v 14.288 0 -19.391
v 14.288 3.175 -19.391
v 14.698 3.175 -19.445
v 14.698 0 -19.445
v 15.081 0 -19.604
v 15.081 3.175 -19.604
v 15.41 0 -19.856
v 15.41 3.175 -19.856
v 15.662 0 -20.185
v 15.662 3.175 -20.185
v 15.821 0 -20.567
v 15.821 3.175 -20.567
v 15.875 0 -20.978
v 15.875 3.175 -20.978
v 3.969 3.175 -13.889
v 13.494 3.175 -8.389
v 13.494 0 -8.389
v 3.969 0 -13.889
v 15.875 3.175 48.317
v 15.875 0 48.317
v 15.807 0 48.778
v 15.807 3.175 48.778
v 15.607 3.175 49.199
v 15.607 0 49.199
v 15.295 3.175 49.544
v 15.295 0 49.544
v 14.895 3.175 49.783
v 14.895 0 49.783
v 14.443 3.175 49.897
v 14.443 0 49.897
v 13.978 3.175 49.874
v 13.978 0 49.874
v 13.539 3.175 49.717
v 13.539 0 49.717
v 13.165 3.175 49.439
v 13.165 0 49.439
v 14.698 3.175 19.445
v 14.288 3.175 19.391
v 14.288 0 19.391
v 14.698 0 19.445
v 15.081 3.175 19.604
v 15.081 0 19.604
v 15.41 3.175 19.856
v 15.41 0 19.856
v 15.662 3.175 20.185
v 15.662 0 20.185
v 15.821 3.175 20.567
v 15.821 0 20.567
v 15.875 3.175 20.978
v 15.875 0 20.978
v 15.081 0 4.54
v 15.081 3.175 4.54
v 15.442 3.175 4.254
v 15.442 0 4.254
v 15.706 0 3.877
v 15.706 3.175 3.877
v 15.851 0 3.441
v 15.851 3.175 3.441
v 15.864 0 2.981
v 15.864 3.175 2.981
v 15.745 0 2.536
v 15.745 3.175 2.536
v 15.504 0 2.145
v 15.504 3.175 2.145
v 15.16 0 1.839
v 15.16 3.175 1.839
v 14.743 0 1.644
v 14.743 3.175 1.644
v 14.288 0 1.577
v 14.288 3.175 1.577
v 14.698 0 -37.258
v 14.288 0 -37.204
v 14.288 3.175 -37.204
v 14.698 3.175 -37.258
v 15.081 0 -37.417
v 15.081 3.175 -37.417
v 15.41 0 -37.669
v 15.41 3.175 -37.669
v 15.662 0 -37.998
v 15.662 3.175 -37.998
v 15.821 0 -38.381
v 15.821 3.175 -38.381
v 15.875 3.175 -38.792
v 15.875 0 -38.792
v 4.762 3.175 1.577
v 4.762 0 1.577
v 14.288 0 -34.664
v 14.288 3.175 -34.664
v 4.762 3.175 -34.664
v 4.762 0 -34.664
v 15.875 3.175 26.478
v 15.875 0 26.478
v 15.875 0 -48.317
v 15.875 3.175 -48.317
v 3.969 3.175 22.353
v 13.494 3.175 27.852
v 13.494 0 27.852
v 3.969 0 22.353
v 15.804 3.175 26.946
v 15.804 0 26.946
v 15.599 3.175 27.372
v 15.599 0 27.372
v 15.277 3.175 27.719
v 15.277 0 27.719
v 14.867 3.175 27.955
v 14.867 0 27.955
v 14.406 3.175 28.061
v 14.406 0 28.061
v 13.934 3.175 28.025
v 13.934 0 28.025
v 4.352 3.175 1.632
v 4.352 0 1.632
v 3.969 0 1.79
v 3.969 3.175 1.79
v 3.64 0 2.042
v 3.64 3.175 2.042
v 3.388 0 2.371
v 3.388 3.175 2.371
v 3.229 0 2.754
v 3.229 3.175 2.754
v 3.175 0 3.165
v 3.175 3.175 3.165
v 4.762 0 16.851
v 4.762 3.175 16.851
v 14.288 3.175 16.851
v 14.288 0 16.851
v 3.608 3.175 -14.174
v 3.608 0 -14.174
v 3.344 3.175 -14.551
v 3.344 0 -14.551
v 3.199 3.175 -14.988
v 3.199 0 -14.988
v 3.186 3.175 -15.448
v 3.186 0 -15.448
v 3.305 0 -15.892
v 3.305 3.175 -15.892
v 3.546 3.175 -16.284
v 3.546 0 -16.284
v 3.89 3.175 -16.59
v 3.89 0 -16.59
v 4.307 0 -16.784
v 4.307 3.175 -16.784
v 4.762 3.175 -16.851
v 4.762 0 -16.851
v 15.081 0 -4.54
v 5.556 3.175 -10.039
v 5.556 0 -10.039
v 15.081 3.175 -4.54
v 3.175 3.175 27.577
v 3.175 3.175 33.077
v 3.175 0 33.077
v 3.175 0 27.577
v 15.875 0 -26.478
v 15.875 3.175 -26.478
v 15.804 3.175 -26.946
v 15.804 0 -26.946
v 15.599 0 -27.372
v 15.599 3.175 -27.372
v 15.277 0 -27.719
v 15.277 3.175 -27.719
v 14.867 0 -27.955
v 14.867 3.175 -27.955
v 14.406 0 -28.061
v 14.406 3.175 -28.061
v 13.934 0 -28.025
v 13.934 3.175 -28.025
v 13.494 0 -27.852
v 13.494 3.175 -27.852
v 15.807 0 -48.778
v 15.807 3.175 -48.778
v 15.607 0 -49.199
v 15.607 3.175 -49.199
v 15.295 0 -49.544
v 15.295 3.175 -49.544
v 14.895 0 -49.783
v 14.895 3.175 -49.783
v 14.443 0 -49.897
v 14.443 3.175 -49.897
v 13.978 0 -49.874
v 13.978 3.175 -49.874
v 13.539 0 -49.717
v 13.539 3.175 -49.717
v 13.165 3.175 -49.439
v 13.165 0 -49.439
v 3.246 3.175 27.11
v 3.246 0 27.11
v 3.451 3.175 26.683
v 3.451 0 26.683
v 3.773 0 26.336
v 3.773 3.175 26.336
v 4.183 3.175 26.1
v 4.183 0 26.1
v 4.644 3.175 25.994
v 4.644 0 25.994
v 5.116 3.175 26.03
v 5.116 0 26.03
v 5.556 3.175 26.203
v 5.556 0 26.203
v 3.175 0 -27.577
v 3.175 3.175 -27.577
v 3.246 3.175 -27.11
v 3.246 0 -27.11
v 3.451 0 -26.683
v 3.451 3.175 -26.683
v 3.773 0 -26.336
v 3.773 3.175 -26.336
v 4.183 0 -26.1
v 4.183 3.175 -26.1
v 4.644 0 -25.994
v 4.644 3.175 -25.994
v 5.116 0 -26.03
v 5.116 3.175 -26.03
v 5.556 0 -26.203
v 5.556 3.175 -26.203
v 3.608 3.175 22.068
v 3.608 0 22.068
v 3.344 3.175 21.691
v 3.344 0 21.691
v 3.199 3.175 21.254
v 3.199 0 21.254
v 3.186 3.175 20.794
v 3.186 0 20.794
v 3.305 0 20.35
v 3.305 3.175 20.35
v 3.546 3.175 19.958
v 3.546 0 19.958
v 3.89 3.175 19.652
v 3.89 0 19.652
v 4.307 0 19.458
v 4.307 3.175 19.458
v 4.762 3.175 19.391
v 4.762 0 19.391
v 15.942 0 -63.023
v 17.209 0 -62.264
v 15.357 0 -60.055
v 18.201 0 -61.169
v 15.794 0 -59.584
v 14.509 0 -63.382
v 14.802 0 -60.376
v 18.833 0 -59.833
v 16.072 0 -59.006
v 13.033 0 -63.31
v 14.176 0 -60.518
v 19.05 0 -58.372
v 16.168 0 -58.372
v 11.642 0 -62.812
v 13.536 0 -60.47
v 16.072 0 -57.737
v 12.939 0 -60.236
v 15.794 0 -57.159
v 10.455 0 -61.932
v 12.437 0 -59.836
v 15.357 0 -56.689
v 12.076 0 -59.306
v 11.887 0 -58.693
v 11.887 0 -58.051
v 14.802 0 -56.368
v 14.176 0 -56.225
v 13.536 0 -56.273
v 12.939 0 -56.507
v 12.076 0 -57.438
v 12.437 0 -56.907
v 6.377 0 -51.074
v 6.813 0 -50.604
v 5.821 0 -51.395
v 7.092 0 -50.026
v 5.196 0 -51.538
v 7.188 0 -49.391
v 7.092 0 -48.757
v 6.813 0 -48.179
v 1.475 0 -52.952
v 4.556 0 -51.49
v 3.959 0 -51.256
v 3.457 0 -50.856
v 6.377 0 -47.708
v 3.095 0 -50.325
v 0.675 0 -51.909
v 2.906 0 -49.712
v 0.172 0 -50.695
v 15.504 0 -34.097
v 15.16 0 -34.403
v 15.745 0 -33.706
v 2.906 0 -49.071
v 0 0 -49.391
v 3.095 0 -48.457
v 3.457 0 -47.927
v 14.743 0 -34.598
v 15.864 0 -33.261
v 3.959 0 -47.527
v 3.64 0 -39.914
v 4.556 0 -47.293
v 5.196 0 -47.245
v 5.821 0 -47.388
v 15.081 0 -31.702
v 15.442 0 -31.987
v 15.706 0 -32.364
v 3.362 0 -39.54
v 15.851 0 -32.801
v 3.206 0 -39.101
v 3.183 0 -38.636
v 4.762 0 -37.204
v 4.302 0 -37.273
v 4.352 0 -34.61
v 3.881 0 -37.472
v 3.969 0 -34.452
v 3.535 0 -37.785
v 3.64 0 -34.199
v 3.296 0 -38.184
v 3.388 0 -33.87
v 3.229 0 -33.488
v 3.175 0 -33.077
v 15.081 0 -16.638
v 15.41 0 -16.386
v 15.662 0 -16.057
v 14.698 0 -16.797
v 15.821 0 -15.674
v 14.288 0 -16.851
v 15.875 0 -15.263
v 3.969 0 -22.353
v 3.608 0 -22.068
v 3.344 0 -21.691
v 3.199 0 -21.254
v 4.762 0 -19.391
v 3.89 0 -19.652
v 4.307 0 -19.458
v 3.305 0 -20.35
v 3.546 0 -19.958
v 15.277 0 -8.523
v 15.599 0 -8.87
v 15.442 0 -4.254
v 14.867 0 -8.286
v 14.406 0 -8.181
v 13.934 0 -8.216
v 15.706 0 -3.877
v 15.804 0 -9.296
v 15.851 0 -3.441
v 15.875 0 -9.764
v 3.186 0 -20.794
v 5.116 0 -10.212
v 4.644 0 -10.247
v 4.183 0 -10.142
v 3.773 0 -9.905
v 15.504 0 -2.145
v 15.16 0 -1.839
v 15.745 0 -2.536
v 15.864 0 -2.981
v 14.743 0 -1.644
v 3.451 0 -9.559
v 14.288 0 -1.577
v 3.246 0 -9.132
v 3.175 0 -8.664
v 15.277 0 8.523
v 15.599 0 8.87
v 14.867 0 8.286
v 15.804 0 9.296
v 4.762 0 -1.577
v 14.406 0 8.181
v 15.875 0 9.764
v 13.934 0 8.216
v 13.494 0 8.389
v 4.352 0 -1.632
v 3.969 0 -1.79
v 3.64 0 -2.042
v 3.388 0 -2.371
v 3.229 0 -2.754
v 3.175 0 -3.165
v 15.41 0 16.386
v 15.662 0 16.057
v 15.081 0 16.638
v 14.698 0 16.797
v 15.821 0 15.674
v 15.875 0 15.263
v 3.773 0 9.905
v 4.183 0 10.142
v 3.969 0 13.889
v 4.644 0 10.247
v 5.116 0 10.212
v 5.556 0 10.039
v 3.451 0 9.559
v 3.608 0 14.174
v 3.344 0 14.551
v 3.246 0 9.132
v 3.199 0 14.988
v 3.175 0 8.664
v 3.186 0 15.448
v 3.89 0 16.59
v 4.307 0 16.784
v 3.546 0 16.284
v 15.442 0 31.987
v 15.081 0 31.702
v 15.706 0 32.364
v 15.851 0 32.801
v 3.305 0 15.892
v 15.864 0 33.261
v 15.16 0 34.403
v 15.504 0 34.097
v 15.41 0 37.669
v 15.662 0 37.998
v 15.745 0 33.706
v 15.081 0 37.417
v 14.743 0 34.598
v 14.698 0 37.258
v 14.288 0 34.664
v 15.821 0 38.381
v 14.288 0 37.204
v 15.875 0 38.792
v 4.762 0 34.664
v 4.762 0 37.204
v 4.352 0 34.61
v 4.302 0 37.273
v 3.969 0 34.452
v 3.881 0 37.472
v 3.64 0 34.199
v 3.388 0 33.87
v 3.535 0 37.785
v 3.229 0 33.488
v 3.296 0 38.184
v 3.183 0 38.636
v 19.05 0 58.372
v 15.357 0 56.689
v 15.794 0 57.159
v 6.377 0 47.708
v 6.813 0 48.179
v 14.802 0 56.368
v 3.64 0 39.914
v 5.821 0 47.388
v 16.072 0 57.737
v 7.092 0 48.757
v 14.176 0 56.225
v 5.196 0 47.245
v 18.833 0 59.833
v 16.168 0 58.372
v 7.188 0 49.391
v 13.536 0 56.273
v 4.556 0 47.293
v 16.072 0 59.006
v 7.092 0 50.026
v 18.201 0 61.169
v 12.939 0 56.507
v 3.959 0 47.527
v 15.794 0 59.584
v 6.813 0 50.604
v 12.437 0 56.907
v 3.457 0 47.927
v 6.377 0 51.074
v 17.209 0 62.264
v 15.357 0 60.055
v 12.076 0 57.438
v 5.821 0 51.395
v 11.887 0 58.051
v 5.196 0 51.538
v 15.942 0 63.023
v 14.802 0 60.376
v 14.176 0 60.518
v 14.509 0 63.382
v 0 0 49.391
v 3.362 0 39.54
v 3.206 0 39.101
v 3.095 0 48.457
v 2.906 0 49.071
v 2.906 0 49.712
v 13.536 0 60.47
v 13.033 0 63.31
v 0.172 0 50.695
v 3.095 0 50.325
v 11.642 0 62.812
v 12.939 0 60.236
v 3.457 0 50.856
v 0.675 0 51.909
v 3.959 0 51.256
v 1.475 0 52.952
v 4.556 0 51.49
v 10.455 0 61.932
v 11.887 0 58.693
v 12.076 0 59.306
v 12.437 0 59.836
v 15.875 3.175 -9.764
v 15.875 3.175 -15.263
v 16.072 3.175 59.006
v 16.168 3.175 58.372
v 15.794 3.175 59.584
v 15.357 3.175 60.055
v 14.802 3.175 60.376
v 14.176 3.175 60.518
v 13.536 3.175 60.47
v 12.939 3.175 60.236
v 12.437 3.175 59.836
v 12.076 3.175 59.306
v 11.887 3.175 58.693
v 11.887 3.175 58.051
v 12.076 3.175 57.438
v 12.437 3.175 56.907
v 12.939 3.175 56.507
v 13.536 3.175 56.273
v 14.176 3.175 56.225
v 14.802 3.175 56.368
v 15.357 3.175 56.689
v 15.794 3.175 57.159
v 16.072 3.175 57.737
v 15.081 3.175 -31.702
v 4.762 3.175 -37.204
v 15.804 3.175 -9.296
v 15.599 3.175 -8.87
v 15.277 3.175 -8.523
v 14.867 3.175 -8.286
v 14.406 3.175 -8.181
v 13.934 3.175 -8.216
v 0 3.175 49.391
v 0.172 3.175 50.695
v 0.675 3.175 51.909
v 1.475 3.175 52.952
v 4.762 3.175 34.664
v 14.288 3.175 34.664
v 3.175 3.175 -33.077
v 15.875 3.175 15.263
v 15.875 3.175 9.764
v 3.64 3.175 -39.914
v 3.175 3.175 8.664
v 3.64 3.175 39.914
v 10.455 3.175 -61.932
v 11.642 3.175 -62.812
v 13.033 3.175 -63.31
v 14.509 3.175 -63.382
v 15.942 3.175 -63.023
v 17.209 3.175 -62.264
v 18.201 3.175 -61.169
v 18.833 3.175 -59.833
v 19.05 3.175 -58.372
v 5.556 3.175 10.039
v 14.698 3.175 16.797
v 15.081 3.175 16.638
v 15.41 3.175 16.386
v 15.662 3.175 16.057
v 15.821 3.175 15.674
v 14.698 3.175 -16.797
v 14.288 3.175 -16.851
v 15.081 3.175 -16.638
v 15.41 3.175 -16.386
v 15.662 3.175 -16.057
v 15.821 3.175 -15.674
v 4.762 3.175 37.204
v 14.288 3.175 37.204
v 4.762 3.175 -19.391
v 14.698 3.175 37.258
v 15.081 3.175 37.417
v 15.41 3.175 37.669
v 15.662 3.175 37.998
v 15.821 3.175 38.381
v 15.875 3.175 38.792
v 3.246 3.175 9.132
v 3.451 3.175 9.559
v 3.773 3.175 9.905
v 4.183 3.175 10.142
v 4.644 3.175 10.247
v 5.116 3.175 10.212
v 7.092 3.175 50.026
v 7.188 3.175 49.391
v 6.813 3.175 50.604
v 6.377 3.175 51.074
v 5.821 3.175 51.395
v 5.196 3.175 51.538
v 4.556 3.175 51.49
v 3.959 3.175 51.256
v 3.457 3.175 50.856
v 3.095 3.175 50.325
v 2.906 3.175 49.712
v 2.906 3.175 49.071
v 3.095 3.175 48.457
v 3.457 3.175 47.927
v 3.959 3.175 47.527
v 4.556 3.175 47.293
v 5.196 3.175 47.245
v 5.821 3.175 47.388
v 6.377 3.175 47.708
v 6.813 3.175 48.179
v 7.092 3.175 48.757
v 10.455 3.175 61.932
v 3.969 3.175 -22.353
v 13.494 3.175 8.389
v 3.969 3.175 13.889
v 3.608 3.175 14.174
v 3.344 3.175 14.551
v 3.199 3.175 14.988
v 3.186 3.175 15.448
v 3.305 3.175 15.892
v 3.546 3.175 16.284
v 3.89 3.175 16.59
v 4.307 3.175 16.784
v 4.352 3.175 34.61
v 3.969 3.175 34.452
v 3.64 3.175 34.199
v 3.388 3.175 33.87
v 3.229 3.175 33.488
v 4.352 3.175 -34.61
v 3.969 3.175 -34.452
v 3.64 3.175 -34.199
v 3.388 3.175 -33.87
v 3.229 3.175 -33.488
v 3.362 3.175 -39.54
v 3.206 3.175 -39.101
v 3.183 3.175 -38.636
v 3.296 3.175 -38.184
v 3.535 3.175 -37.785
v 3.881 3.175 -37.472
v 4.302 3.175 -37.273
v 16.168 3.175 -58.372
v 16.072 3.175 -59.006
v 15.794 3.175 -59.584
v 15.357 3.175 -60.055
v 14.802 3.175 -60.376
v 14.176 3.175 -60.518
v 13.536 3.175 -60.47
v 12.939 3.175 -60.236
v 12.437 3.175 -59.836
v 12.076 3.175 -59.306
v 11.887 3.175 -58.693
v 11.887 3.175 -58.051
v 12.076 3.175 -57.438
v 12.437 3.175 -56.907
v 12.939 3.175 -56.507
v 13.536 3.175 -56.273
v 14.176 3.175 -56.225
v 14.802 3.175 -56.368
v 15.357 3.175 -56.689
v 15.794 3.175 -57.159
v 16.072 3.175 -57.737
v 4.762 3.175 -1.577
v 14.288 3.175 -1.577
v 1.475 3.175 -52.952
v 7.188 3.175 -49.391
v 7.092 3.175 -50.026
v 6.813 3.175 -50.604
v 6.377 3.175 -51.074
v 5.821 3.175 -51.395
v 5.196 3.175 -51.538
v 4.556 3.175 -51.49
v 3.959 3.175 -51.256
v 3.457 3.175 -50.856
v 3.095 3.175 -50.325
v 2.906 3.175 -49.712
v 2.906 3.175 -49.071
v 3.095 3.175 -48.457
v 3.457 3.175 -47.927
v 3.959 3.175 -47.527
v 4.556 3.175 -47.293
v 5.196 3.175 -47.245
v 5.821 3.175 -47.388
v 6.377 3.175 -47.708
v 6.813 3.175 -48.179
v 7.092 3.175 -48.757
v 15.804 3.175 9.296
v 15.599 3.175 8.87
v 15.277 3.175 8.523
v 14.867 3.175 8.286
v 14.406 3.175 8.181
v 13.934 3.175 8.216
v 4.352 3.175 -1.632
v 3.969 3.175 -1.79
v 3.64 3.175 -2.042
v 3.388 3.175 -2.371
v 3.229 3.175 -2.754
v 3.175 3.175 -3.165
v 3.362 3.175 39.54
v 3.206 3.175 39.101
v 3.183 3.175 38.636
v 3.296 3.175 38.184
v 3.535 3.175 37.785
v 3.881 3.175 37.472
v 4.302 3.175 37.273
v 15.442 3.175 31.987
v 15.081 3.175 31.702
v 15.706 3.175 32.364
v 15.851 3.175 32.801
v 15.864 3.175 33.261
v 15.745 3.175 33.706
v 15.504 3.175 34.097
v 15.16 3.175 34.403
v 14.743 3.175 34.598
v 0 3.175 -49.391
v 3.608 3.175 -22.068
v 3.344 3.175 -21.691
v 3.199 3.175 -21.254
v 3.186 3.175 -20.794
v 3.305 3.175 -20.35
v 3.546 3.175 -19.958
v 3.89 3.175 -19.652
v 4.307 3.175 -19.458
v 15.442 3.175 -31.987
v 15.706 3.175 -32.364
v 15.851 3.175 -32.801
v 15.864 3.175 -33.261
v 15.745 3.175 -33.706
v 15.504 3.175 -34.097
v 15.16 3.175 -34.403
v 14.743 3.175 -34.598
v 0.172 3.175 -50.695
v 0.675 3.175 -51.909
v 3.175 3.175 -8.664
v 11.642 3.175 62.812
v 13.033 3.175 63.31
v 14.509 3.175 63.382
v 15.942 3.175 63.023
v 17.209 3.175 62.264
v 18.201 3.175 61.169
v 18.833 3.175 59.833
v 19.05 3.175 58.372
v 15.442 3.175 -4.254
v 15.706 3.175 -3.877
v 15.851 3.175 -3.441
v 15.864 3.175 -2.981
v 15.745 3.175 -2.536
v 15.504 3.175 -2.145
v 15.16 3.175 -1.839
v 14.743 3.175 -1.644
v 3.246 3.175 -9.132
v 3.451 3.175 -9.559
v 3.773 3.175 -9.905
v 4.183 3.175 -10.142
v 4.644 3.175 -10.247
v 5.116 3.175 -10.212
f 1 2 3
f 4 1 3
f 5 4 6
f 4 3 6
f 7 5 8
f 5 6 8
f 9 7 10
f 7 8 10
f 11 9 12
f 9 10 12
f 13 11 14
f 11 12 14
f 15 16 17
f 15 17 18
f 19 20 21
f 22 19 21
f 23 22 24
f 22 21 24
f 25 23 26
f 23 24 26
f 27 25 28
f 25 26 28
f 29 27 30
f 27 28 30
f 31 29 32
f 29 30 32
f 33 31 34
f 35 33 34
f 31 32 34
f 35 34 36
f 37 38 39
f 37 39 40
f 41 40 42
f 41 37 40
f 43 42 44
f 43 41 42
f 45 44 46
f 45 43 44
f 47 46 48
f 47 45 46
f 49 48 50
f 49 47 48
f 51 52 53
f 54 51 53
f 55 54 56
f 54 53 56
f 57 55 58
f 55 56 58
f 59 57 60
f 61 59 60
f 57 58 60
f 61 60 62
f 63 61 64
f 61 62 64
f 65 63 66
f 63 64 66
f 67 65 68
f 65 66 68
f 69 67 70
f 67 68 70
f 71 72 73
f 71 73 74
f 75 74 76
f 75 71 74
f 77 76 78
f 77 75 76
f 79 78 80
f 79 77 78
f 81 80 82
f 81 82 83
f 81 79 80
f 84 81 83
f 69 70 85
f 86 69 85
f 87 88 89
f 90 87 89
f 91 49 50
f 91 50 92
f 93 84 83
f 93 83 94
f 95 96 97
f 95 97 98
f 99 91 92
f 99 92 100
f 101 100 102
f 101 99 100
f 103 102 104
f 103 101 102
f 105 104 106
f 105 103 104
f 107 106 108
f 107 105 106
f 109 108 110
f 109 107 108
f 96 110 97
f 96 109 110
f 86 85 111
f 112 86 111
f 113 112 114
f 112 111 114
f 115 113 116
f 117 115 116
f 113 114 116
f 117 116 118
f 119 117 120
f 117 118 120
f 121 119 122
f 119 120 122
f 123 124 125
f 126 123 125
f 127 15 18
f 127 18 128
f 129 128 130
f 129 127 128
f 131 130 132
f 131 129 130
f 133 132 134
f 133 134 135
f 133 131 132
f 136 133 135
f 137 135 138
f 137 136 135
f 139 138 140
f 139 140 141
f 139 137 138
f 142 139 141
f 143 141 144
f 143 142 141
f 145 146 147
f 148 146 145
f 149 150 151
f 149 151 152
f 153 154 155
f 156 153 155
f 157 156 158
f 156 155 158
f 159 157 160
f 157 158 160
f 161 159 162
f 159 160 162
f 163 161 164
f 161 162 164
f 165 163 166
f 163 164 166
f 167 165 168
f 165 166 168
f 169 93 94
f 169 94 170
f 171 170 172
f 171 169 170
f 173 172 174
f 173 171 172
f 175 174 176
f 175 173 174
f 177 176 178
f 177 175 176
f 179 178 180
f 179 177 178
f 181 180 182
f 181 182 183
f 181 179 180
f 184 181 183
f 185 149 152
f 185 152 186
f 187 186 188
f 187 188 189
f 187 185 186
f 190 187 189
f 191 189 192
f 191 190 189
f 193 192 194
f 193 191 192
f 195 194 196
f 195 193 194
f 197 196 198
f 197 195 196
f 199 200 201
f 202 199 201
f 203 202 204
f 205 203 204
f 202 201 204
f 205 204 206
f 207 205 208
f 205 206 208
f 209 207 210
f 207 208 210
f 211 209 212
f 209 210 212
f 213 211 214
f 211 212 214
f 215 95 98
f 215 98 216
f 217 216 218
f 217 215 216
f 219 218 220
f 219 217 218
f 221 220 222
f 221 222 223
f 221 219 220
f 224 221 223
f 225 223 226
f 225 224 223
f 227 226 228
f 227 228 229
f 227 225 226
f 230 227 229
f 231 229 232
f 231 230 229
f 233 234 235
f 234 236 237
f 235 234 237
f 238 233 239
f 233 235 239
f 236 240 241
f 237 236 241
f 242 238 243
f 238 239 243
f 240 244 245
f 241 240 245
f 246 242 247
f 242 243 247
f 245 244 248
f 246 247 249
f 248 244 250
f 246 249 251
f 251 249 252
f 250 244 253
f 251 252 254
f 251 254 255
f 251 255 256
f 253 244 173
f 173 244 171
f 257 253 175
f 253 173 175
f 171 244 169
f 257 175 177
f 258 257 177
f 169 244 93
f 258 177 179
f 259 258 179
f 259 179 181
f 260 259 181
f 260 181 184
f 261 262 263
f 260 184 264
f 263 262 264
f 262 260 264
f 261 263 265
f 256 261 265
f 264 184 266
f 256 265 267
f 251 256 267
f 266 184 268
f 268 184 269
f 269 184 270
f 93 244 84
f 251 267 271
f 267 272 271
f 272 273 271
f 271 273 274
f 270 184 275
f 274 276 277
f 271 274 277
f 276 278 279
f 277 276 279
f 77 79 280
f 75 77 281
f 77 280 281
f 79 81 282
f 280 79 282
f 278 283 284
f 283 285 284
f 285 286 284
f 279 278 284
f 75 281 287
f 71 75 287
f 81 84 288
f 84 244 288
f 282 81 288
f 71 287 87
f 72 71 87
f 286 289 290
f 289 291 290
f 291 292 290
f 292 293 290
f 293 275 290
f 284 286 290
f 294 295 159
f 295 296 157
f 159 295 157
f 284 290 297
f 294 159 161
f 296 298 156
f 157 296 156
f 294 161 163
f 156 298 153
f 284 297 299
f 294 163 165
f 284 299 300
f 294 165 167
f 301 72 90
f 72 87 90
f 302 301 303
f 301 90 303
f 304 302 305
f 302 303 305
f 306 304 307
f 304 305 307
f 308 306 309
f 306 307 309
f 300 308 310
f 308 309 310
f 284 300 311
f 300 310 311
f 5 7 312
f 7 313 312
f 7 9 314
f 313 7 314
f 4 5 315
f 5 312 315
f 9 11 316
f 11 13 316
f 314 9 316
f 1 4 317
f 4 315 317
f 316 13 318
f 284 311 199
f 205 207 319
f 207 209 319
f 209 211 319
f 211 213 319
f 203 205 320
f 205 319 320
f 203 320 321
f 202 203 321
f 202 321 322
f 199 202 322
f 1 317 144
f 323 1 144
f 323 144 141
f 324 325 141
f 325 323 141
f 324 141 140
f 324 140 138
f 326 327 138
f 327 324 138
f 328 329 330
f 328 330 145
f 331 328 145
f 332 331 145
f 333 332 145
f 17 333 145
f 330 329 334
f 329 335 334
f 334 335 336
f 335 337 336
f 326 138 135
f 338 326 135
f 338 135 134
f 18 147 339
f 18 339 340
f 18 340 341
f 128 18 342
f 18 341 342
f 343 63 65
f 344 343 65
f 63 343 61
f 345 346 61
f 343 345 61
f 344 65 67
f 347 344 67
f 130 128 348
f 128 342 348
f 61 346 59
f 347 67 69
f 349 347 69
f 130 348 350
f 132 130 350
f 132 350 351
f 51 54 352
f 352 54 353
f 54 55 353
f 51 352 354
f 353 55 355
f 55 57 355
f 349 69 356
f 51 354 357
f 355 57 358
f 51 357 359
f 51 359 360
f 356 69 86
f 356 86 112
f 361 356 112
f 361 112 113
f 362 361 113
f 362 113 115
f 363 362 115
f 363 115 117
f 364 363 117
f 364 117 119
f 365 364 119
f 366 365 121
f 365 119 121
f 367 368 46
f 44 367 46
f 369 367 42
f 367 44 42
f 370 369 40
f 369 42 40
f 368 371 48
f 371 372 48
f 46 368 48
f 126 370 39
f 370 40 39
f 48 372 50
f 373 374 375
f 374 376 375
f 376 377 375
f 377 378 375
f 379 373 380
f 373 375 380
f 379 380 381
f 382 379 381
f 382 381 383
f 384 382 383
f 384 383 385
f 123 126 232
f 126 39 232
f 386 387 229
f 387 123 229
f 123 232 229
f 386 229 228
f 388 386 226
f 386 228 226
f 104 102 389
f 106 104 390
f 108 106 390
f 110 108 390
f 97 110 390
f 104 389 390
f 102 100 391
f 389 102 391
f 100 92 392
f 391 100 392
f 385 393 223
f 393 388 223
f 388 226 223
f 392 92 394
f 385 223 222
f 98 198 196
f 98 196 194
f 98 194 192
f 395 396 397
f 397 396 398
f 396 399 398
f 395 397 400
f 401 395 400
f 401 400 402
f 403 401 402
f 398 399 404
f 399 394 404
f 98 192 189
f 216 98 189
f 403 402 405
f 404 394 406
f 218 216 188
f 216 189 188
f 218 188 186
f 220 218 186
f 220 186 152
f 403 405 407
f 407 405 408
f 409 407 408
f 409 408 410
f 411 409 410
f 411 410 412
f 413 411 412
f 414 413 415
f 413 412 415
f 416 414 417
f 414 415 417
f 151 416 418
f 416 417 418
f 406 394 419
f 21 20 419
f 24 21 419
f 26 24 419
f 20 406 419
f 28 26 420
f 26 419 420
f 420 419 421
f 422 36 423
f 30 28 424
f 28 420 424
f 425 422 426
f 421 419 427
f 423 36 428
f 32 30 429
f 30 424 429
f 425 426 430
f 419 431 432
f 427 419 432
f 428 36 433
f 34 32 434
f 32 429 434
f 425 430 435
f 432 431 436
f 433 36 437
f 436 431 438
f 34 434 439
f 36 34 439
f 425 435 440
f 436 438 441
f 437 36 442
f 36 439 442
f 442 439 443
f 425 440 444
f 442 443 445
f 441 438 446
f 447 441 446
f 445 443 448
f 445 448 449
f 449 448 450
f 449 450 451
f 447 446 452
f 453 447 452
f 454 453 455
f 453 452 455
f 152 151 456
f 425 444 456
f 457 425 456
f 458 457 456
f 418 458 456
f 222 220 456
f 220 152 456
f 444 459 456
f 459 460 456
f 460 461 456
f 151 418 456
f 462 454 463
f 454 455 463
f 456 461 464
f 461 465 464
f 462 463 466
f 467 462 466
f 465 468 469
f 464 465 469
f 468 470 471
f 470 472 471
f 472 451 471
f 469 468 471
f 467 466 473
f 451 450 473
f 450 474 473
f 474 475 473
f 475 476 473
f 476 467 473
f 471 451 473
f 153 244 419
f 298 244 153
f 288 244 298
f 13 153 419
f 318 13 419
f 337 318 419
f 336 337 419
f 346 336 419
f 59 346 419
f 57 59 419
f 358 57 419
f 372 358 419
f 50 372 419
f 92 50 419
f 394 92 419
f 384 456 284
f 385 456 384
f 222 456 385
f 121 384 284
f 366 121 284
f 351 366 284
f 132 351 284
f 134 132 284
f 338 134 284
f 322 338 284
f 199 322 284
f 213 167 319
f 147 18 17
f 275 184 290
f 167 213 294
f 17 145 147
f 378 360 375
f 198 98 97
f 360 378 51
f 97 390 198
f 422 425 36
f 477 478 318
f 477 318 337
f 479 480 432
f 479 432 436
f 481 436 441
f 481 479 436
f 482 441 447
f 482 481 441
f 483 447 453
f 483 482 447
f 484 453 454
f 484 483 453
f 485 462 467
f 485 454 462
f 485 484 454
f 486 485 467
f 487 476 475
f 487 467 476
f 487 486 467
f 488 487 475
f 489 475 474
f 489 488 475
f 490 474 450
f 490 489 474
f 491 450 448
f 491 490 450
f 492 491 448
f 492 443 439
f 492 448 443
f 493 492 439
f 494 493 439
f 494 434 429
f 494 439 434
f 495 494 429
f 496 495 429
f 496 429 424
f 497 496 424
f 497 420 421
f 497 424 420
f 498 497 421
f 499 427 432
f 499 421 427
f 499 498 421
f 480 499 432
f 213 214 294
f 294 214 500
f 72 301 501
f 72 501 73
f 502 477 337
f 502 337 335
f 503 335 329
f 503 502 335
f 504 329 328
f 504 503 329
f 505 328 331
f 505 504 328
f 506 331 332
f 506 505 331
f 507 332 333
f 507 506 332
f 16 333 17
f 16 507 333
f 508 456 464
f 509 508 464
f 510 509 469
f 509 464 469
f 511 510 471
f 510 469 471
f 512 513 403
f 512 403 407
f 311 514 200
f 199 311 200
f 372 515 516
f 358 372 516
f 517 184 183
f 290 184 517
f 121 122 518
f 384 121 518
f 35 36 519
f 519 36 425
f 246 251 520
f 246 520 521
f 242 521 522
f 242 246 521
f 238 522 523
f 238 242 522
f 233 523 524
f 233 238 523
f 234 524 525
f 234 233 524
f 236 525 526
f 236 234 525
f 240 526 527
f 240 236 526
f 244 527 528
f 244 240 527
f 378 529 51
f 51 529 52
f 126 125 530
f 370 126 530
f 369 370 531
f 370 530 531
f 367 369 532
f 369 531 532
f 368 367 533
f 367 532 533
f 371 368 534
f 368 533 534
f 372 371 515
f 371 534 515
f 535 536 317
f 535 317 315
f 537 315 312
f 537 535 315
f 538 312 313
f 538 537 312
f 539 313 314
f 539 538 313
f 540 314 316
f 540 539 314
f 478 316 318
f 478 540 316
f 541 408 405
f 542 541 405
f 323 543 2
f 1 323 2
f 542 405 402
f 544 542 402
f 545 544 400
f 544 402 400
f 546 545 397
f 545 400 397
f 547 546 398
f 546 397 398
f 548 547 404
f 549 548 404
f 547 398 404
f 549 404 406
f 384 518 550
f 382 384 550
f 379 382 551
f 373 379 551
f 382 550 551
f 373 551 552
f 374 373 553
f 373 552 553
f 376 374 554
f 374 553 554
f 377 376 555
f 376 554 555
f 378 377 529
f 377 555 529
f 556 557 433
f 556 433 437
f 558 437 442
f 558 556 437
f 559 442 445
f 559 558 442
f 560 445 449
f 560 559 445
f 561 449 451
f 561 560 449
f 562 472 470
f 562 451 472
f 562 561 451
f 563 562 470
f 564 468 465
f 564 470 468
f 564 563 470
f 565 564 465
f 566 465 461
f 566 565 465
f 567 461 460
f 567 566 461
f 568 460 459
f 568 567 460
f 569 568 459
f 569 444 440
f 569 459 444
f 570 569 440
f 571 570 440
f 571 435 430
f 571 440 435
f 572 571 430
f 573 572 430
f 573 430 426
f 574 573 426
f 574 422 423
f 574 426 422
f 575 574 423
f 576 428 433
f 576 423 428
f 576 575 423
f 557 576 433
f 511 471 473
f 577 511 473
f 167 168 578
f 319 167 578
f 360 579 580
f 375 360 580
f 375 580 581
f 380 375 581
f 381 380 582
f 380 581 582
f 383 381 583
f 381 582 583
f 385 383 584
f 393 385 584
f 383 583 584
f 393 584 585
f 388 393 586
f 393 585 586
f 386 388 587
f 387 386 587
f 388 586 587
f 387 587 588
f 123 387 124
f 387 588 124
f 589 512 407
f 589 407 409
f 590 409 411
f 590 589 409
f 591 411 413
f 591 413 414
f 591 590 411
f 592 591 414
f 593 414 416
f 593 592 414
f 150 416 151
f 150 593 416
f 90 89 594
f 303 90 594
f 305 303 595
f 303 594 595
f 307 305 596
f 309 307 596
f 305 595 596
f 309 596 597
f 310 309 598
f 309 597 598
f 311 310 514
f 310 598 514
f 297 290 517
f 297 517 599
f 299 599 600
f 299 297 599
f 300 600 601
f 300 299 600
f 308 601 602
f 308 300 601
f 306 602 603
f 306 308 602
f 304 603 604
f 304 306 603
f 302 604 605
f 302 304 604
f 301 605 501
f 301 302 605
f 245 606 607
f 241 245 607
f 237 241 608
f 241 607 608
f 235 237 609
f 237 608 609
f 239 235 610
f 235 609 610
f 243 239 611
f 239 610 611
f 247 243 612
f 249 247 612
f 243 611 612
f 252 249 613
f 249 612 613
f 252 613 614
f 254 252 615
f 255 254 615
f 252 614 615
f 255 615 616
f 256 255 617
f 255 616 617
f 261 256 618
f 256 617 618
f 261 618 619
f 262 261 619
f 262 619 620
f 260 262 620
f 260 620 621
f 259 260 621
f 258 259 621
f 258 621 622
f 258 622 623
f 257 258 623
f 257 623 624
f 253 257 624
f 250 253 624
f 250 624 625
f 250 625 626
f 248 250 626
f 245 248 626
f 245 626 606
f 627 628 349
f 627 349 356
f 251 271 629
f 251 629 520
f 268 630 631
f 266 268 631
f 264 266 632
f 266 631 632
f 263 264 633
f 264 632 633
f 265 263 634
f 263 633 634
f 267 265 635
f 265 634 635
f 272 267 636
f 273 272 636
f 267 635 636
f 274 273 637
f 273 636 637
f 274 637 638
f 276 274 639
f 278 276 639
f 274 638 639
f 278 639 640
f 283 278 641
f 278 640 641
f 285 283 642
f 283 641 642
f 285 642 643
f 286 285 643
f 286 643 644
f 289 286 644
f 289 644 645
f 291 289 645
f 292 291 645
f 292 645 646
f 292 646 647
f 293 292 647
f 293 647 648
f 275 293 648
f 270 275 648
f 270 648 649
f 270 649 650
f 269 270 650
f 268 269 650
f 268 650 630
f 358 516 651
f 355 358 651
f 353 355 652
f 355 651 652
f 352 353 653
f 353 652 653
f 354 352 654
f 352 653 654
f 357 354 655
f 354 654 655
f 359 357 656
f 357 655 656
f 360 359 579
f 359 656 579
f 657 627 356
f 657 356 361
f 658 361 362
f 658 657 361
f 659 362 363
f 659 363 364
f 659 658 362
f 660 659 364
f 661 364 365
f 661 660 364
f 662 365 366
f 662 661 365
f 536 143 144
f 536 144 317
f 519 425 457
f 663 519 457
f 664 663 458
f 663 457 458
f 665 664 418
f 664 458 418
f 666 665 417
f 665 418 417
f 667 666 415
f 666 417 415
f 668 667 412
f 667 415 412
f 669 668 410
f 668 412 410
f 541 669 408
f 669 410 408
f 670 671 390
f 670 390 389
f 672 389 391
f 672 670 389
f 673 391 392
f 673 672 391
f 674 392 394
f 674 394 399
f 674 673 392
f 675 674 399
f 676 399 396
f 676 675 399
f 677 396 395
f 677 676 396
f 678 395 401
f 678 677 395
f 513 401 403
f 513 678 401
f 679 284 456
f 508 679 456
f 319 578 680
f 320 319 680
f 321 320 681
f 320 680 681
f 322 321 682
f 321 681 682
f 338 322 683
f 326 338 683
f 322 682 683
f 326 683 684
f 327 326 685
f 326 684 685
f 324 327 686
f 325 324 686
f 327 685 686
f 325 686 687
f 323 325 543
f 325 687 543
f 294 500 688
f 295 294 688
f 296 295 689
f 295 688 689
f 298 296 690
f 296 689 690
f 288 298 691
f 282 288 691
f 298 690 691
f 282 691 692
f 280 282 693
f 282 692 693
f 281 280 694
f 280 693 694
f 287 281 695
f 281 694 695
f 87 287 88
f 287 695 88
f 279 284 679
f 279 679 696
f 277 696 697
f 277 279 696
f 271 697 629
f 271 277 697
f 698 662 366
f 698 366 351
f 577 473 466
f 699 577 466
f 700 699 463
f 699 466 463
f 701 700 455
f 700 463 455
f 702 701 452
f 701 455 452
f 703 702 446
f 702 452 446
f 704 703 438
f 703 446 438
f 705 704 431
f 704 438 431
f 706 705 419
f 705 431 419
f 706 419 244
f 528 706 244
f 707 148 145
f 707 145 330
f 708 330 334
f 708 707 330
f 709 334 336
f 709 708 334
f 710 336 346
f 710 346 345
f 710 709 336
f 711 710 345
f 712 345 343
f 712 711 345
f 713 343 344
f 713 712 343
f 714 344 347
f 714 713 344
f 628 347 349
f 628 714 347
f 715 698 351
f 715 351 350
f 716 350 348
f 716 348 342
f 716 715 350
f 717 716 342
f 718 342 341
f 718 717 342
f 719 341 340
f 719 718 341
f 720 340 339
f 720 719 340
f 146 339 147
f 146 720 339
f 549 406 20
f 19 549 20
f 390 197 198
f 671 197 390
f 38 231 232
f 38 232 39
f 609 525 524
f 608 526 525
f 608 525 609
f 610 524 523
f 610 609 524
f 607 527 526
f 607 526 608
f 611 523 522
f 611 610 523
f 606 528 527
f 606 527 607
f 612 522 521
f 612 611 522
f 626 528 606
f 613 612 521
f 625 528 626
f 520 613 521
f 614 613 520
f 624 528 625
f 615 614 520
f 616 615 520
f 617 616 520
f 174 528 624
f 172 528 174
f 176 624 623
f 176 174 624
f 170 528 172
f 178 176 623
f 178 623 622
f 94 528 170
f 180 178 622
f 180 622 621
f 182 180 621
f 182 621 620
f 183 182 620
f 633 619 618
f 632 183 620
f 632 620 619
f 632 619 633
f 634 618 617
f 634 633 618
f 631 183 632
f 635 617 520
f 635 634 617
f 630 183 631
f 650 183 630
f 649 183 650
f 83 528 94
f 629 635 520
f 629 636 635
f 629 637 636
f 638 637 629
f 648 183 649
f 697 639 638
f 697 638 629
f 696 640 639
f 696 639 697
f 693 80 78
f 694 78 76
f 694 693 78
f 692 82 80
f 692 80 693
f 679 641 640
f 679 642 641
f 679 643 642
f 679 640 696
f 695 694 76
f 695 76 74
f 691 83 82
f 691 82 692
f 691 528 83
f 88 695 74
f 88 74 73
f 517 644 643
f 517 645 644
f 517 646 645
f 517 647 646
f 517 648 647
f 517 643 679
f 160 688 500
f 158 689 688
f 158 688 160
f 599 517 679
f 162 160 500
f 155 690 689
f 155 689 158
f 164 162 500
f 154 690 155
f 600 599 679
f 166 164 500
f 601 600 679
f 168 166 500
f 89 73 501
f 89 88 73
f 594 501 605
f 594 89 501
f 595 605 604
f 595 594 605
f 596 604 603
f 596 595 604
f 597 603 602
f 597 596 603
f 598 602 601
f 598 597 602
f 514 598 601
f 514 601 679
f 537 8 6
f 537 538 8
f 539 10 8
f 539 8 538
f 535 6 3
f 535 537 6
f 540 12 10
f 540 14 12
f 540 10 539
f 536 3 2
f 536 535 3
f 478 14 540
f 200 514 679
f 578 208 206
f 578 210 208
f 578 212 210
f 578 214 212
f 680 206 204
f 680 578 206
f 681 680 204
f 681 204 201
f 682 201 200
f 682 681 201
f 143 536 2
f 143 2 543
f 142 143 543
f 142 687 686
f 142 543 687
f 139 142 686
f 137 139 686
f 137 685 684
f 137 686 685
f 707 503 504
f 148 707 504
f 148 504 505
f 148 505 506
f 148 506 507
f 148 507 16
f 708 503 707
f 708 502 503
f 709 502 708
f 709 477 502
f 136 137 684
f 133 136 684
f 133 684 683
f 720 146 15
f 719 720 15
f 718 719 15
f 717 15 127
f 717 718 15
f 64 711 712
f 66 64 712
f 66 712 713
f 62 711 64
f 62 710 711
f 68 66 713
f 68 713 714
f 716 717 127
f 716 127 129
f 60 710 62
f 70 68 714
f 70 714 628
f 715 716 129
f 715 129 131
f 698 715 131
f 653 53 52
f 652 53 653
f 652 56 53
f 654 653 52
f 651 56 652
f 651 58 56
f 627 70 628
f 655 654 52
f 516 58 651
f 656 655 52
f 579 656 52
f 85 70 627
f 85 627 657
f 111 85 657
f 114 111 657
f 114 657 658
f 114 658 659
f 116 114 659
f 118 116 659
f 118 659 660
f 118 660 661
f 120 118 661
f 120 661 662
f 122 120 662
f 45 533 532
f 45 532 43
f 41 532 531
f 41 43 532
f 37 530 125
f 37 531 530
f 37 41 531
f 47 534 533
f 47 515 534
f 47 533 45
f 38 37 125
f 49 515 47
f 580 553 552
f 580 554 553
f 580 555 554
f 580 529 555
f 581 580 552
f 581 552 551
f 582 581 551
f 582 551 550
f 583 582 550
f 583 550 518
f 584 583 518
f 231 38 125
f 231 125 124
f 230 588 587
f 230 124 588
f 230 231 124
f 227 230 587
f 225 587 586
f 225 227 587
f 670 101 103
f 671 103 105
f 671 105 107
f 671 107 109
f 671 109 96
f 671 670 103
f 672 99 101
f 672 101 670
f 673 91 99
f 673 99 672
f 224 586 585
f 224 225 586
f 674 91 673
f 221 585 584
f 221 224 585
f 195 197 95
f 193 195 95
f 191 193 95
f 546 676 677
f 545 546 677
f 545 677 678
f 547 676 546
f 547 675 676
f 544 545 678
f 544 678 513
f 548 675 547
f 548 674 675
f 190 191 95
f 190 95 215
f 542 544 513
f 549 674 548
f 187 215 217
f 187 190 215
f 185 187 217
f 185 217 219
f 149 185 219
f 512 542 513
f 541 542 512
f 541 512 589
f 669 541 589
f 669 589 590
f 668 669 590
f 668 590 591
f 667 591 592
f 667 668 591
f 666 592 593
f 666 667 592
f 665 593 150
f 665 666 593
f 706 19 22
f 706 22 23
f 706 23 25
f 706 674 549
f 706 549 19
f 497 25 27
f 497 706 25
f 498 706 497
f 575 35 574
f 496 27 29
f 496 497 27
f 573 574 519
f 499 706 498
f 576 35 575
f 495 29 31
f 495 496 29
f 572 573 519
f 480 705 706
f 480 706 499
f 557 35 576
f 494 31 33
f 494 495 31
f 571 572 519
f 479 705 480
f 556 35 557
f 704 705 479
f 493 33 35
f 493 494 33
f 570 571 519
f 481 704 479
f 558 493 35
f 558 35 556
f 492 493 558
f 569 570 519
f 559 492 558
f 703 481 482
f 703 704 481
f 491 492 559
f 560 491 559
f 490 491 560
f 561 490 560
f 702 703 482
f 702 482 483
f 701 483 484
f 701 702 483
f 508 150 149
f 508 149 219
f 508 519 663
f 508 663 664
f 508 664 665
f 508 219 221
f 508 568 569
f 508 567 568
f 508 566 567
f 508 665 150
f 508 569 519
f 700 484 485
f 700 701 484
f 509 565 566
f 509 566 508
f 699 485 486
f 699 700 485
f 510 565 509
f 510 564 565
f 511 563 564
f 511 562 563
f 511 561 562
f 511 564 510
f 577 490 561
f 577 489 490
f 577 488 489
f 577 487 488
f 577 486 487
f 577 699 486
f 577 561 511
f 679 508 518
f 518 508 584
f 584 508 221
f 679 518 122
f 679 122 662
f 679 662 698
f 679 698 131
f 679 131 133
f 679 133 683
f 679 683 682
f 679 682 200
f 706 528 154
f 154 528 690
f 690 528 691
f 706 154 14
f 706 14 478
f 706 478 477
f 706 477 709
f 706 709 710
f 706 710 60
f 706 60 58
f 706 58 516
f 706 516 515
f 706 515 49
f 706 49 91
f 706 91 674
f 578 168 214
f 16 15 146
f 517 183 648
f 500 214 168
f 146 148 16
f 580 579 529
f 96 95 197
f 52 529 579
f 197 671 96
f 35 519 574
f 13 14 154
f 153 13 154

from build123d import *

# Parameters (mm, degrees)
SKETCH1_R                    = 2.0828
BOSS_EXTRUDE1_DEPTH          = 3.175
F_18_0_1695_DIAMETER_HOLE1_D = 4.3053
CUT_EXTRUDE2_DEPTH           = 3.175
MIRROR1_COPY_1_DEPTH         = 3.175


with BuildPart() as part:
    # Sketch1 → Boss-Extrude1 (new body)
    with BuildSketch(Plane(origin=(0, 0, 0), x_dir=(1, 0, 0), z_dir=(0, 1, 0))):
        with BuildLine():
            Line((0, 0), (0, 49.391408666))
            ThreePointArc((0, 49.391408666), (0.383256806, 51.318170741), (1.474679849, 52.951600757))
            Line((1.474679849, 52.951600757), (10.45493597, 61.931856878))
            ThreePointArc((10.45493597, 61.931856878), (15.941890136, 63.023279921), (19.05, 58.371664787))
            Line((19.05, 58.371664787), (19.05, 0))
            Line((19.05, 0), (0, 0))
        make_face()
        with Locations(Location((14.015128061, 58.371664787, 0), (0, 0, 270))):
            Circle(SKETCH1_R, mode=Mode.SUBTRACT)
        with Locations(Location((5.034871939, 49.391408666, 0), (0, 0, 270))):
            Circle(SKETCH1_R, mode=Mode.SUBTRACT)
        with BuildLine():
            Line((13.164967985, 49.439274202), (3.639967985, 39.914274202))
            ThreePointArc((3.639967985, 39.914274202), (3.295841242, 38.184232238), (4.7625, 37.204242187))
            Line((4.7625, 37.204242187), (14.2875, 37.204242187))
            ThreePointArc((14.2875, 37.204242187), (15.410032015, 37.669210172), (15.875, 38.791742187))
            Line((15.875, 38.791742187), (15.875, 48.316742187))
            ThreePointArc((15.875, 48.316742187), (14.895009949, 49.783400945), (13.164967985, 49.439274202))
        make_face(mode=Mode.SUBTRACT)
    boss_extrude1 = extrude(amount=BOSS_EXTRUDE1_DEPTH)

    # #18 (0.1695) Diameter Hole1 (through all)
    with Locations(Plane(origin=(0, 0, 0), x_dir=(-1, 0, 0), z_dir=(0, -1, 0))):
        with Locations((-14.015128061, 58.371664787), (-5.034871939, 49.391408666)):
            f_18_0_1695_diameter_hole1 = Hole(F_18_0_1695_DIAMETER_HOLE1_D / 2)

    # Sketch5 → Cut-Extrude2 (cut)
    with BuildSketch(Plane(origin=(0, 3.175, 0), x_dir=(1, 0, 0), z_dir=(0, 1, 0))):
        with BuildLine():
            Line((14.2875, 34.664242187), (4.7625, 34.664242187))
            ThreePointArc((4.7625, 34.664242187), (3.639967985, 34.199274202), (3.175, 33.076742187))
            Line((3.175, 33.076742187), (3.175, 27.577480873))
            ThreePointArc((3.175, 27.577480873), (3.96875, 26.202665545), (5.55625, 26.202665545))
            Line((5.55625, 26.202665545), (15.08125, 31.701926859))
            ThreePointArc((15.08125, 31.701926859), (15.820907249, 33.487617421), (14.2875, 34.664242187))
        make_face()
        with BuildLine():
            Line((13.49375, 27.852443939), (3.96875, 22.353182625))
            ThreePointArc((3.96875, 22.353182625), (3.229092751, 20.567492062), (4.7625, 19.390867296))
            Line((4.7625, 19.390867296), (14.2875, 19.390867296))
            ThreePointArc((14.2875, 19.390867296), (15.410032015, 19.855835281), (15.875, 20.978367296))
            Line((15.875, 20.978367296), (15.875, 26.47762861))
            ThreePointArc((15.875, 26.47762861), (15.08125, 27.852443939), (13.49375, 27.852443939))
        make_face()
    cut_extrude2 = extrude(amount=-CUT_EXTRUDE2_DEPTH, mode=Mode.SUBTRACT)

    # Mirror2: Cut-Extrude2 across plane
    add(cut_extrude2.mirror(Plane(origin=(0, 0, -18.120867296), x_dir=(1, 0, 0), z_dir=(0, 0, -1))), mode=Mode.SUBTRACT)

    # Mirror1: Boss-Extrude1, #18 (0.1695) Diameter Hole1, Cut-Extrude2 across plane
    add(boss_extrude1.mirror(Plane(origin=(19.05, 3.175, 0), x_dir=(1, 0, 0), z_dir=(0, 0, -1))))
    add(f_18_0_1695_diameter_hole1.mirror(Plane(origin=(19.05, 3.175, 0), x_dir=(1, 0, 0), z_dir=(0, 0, -1))), mode=Mode.SUBTRACT)
    add(cut_extrude2.mirror(Plane(origin=(19.05, 3.175, 0), x_dir=(1, 0, 0), z_dir=(0, 0, -1))), mode=Mode.SUBTRACT)

    # Mirror1 copy 1 sketch → Mirror1 copy 1 (cut)
    with BuildSketch(Plane(origin=(0, 3.175, 36.241734593), x_dir=(1, 0, 0), z_dir=(0, 1, 0))):
        with BuildLine():
            Line((14.2875, 34.664242187), (4.7625, 34.664242187))
            ThreePointArc((4.7625, 34.664242187), (3.639967985, 34.199274202), (3.175, 33.076742187))
            Line((3.175, 33.076742187), (3.175, 27.577480873))
            ThreePointArc((3.175, 27.577480873), (3.96875, 26.202665545), (5.55625, 26.202665545))
            Line((5.55625, 26.202665545), (15.08125, 31.701926859))
            ThreePointArc((15.08125, 31.701926859), (15.820907249, 33.487617421), (14.2875, 34.664242187))
        make_face()
        with BuildLine():
            Line((13.49375, 27.852443939), (3.96875, 22.353182625))
            ThreePointArc((3.96875, 22.353182625), (3.229092751, 20.567492062), (4.7625, 19.390867296))
            Line((4.7625, 19.390867296), (14.2875, 19.390867296))
            ThreePointArc((14.2875, 19.390867296), (15.410032015, 19.855835281), (15.875, 20.978367296))
            Line((15.875, 20.978367296), (15.875, 26.47762861))
            ThreePointArc((15.875, 26.47762861), (15.08125, 27.852443939), (13.49375, 27.852443939))
        make_face()
    extrude(amount=-MIRROR1_COPY_1_DEPTH, mode=Mode.SUBTRACT)


solid = part.part
